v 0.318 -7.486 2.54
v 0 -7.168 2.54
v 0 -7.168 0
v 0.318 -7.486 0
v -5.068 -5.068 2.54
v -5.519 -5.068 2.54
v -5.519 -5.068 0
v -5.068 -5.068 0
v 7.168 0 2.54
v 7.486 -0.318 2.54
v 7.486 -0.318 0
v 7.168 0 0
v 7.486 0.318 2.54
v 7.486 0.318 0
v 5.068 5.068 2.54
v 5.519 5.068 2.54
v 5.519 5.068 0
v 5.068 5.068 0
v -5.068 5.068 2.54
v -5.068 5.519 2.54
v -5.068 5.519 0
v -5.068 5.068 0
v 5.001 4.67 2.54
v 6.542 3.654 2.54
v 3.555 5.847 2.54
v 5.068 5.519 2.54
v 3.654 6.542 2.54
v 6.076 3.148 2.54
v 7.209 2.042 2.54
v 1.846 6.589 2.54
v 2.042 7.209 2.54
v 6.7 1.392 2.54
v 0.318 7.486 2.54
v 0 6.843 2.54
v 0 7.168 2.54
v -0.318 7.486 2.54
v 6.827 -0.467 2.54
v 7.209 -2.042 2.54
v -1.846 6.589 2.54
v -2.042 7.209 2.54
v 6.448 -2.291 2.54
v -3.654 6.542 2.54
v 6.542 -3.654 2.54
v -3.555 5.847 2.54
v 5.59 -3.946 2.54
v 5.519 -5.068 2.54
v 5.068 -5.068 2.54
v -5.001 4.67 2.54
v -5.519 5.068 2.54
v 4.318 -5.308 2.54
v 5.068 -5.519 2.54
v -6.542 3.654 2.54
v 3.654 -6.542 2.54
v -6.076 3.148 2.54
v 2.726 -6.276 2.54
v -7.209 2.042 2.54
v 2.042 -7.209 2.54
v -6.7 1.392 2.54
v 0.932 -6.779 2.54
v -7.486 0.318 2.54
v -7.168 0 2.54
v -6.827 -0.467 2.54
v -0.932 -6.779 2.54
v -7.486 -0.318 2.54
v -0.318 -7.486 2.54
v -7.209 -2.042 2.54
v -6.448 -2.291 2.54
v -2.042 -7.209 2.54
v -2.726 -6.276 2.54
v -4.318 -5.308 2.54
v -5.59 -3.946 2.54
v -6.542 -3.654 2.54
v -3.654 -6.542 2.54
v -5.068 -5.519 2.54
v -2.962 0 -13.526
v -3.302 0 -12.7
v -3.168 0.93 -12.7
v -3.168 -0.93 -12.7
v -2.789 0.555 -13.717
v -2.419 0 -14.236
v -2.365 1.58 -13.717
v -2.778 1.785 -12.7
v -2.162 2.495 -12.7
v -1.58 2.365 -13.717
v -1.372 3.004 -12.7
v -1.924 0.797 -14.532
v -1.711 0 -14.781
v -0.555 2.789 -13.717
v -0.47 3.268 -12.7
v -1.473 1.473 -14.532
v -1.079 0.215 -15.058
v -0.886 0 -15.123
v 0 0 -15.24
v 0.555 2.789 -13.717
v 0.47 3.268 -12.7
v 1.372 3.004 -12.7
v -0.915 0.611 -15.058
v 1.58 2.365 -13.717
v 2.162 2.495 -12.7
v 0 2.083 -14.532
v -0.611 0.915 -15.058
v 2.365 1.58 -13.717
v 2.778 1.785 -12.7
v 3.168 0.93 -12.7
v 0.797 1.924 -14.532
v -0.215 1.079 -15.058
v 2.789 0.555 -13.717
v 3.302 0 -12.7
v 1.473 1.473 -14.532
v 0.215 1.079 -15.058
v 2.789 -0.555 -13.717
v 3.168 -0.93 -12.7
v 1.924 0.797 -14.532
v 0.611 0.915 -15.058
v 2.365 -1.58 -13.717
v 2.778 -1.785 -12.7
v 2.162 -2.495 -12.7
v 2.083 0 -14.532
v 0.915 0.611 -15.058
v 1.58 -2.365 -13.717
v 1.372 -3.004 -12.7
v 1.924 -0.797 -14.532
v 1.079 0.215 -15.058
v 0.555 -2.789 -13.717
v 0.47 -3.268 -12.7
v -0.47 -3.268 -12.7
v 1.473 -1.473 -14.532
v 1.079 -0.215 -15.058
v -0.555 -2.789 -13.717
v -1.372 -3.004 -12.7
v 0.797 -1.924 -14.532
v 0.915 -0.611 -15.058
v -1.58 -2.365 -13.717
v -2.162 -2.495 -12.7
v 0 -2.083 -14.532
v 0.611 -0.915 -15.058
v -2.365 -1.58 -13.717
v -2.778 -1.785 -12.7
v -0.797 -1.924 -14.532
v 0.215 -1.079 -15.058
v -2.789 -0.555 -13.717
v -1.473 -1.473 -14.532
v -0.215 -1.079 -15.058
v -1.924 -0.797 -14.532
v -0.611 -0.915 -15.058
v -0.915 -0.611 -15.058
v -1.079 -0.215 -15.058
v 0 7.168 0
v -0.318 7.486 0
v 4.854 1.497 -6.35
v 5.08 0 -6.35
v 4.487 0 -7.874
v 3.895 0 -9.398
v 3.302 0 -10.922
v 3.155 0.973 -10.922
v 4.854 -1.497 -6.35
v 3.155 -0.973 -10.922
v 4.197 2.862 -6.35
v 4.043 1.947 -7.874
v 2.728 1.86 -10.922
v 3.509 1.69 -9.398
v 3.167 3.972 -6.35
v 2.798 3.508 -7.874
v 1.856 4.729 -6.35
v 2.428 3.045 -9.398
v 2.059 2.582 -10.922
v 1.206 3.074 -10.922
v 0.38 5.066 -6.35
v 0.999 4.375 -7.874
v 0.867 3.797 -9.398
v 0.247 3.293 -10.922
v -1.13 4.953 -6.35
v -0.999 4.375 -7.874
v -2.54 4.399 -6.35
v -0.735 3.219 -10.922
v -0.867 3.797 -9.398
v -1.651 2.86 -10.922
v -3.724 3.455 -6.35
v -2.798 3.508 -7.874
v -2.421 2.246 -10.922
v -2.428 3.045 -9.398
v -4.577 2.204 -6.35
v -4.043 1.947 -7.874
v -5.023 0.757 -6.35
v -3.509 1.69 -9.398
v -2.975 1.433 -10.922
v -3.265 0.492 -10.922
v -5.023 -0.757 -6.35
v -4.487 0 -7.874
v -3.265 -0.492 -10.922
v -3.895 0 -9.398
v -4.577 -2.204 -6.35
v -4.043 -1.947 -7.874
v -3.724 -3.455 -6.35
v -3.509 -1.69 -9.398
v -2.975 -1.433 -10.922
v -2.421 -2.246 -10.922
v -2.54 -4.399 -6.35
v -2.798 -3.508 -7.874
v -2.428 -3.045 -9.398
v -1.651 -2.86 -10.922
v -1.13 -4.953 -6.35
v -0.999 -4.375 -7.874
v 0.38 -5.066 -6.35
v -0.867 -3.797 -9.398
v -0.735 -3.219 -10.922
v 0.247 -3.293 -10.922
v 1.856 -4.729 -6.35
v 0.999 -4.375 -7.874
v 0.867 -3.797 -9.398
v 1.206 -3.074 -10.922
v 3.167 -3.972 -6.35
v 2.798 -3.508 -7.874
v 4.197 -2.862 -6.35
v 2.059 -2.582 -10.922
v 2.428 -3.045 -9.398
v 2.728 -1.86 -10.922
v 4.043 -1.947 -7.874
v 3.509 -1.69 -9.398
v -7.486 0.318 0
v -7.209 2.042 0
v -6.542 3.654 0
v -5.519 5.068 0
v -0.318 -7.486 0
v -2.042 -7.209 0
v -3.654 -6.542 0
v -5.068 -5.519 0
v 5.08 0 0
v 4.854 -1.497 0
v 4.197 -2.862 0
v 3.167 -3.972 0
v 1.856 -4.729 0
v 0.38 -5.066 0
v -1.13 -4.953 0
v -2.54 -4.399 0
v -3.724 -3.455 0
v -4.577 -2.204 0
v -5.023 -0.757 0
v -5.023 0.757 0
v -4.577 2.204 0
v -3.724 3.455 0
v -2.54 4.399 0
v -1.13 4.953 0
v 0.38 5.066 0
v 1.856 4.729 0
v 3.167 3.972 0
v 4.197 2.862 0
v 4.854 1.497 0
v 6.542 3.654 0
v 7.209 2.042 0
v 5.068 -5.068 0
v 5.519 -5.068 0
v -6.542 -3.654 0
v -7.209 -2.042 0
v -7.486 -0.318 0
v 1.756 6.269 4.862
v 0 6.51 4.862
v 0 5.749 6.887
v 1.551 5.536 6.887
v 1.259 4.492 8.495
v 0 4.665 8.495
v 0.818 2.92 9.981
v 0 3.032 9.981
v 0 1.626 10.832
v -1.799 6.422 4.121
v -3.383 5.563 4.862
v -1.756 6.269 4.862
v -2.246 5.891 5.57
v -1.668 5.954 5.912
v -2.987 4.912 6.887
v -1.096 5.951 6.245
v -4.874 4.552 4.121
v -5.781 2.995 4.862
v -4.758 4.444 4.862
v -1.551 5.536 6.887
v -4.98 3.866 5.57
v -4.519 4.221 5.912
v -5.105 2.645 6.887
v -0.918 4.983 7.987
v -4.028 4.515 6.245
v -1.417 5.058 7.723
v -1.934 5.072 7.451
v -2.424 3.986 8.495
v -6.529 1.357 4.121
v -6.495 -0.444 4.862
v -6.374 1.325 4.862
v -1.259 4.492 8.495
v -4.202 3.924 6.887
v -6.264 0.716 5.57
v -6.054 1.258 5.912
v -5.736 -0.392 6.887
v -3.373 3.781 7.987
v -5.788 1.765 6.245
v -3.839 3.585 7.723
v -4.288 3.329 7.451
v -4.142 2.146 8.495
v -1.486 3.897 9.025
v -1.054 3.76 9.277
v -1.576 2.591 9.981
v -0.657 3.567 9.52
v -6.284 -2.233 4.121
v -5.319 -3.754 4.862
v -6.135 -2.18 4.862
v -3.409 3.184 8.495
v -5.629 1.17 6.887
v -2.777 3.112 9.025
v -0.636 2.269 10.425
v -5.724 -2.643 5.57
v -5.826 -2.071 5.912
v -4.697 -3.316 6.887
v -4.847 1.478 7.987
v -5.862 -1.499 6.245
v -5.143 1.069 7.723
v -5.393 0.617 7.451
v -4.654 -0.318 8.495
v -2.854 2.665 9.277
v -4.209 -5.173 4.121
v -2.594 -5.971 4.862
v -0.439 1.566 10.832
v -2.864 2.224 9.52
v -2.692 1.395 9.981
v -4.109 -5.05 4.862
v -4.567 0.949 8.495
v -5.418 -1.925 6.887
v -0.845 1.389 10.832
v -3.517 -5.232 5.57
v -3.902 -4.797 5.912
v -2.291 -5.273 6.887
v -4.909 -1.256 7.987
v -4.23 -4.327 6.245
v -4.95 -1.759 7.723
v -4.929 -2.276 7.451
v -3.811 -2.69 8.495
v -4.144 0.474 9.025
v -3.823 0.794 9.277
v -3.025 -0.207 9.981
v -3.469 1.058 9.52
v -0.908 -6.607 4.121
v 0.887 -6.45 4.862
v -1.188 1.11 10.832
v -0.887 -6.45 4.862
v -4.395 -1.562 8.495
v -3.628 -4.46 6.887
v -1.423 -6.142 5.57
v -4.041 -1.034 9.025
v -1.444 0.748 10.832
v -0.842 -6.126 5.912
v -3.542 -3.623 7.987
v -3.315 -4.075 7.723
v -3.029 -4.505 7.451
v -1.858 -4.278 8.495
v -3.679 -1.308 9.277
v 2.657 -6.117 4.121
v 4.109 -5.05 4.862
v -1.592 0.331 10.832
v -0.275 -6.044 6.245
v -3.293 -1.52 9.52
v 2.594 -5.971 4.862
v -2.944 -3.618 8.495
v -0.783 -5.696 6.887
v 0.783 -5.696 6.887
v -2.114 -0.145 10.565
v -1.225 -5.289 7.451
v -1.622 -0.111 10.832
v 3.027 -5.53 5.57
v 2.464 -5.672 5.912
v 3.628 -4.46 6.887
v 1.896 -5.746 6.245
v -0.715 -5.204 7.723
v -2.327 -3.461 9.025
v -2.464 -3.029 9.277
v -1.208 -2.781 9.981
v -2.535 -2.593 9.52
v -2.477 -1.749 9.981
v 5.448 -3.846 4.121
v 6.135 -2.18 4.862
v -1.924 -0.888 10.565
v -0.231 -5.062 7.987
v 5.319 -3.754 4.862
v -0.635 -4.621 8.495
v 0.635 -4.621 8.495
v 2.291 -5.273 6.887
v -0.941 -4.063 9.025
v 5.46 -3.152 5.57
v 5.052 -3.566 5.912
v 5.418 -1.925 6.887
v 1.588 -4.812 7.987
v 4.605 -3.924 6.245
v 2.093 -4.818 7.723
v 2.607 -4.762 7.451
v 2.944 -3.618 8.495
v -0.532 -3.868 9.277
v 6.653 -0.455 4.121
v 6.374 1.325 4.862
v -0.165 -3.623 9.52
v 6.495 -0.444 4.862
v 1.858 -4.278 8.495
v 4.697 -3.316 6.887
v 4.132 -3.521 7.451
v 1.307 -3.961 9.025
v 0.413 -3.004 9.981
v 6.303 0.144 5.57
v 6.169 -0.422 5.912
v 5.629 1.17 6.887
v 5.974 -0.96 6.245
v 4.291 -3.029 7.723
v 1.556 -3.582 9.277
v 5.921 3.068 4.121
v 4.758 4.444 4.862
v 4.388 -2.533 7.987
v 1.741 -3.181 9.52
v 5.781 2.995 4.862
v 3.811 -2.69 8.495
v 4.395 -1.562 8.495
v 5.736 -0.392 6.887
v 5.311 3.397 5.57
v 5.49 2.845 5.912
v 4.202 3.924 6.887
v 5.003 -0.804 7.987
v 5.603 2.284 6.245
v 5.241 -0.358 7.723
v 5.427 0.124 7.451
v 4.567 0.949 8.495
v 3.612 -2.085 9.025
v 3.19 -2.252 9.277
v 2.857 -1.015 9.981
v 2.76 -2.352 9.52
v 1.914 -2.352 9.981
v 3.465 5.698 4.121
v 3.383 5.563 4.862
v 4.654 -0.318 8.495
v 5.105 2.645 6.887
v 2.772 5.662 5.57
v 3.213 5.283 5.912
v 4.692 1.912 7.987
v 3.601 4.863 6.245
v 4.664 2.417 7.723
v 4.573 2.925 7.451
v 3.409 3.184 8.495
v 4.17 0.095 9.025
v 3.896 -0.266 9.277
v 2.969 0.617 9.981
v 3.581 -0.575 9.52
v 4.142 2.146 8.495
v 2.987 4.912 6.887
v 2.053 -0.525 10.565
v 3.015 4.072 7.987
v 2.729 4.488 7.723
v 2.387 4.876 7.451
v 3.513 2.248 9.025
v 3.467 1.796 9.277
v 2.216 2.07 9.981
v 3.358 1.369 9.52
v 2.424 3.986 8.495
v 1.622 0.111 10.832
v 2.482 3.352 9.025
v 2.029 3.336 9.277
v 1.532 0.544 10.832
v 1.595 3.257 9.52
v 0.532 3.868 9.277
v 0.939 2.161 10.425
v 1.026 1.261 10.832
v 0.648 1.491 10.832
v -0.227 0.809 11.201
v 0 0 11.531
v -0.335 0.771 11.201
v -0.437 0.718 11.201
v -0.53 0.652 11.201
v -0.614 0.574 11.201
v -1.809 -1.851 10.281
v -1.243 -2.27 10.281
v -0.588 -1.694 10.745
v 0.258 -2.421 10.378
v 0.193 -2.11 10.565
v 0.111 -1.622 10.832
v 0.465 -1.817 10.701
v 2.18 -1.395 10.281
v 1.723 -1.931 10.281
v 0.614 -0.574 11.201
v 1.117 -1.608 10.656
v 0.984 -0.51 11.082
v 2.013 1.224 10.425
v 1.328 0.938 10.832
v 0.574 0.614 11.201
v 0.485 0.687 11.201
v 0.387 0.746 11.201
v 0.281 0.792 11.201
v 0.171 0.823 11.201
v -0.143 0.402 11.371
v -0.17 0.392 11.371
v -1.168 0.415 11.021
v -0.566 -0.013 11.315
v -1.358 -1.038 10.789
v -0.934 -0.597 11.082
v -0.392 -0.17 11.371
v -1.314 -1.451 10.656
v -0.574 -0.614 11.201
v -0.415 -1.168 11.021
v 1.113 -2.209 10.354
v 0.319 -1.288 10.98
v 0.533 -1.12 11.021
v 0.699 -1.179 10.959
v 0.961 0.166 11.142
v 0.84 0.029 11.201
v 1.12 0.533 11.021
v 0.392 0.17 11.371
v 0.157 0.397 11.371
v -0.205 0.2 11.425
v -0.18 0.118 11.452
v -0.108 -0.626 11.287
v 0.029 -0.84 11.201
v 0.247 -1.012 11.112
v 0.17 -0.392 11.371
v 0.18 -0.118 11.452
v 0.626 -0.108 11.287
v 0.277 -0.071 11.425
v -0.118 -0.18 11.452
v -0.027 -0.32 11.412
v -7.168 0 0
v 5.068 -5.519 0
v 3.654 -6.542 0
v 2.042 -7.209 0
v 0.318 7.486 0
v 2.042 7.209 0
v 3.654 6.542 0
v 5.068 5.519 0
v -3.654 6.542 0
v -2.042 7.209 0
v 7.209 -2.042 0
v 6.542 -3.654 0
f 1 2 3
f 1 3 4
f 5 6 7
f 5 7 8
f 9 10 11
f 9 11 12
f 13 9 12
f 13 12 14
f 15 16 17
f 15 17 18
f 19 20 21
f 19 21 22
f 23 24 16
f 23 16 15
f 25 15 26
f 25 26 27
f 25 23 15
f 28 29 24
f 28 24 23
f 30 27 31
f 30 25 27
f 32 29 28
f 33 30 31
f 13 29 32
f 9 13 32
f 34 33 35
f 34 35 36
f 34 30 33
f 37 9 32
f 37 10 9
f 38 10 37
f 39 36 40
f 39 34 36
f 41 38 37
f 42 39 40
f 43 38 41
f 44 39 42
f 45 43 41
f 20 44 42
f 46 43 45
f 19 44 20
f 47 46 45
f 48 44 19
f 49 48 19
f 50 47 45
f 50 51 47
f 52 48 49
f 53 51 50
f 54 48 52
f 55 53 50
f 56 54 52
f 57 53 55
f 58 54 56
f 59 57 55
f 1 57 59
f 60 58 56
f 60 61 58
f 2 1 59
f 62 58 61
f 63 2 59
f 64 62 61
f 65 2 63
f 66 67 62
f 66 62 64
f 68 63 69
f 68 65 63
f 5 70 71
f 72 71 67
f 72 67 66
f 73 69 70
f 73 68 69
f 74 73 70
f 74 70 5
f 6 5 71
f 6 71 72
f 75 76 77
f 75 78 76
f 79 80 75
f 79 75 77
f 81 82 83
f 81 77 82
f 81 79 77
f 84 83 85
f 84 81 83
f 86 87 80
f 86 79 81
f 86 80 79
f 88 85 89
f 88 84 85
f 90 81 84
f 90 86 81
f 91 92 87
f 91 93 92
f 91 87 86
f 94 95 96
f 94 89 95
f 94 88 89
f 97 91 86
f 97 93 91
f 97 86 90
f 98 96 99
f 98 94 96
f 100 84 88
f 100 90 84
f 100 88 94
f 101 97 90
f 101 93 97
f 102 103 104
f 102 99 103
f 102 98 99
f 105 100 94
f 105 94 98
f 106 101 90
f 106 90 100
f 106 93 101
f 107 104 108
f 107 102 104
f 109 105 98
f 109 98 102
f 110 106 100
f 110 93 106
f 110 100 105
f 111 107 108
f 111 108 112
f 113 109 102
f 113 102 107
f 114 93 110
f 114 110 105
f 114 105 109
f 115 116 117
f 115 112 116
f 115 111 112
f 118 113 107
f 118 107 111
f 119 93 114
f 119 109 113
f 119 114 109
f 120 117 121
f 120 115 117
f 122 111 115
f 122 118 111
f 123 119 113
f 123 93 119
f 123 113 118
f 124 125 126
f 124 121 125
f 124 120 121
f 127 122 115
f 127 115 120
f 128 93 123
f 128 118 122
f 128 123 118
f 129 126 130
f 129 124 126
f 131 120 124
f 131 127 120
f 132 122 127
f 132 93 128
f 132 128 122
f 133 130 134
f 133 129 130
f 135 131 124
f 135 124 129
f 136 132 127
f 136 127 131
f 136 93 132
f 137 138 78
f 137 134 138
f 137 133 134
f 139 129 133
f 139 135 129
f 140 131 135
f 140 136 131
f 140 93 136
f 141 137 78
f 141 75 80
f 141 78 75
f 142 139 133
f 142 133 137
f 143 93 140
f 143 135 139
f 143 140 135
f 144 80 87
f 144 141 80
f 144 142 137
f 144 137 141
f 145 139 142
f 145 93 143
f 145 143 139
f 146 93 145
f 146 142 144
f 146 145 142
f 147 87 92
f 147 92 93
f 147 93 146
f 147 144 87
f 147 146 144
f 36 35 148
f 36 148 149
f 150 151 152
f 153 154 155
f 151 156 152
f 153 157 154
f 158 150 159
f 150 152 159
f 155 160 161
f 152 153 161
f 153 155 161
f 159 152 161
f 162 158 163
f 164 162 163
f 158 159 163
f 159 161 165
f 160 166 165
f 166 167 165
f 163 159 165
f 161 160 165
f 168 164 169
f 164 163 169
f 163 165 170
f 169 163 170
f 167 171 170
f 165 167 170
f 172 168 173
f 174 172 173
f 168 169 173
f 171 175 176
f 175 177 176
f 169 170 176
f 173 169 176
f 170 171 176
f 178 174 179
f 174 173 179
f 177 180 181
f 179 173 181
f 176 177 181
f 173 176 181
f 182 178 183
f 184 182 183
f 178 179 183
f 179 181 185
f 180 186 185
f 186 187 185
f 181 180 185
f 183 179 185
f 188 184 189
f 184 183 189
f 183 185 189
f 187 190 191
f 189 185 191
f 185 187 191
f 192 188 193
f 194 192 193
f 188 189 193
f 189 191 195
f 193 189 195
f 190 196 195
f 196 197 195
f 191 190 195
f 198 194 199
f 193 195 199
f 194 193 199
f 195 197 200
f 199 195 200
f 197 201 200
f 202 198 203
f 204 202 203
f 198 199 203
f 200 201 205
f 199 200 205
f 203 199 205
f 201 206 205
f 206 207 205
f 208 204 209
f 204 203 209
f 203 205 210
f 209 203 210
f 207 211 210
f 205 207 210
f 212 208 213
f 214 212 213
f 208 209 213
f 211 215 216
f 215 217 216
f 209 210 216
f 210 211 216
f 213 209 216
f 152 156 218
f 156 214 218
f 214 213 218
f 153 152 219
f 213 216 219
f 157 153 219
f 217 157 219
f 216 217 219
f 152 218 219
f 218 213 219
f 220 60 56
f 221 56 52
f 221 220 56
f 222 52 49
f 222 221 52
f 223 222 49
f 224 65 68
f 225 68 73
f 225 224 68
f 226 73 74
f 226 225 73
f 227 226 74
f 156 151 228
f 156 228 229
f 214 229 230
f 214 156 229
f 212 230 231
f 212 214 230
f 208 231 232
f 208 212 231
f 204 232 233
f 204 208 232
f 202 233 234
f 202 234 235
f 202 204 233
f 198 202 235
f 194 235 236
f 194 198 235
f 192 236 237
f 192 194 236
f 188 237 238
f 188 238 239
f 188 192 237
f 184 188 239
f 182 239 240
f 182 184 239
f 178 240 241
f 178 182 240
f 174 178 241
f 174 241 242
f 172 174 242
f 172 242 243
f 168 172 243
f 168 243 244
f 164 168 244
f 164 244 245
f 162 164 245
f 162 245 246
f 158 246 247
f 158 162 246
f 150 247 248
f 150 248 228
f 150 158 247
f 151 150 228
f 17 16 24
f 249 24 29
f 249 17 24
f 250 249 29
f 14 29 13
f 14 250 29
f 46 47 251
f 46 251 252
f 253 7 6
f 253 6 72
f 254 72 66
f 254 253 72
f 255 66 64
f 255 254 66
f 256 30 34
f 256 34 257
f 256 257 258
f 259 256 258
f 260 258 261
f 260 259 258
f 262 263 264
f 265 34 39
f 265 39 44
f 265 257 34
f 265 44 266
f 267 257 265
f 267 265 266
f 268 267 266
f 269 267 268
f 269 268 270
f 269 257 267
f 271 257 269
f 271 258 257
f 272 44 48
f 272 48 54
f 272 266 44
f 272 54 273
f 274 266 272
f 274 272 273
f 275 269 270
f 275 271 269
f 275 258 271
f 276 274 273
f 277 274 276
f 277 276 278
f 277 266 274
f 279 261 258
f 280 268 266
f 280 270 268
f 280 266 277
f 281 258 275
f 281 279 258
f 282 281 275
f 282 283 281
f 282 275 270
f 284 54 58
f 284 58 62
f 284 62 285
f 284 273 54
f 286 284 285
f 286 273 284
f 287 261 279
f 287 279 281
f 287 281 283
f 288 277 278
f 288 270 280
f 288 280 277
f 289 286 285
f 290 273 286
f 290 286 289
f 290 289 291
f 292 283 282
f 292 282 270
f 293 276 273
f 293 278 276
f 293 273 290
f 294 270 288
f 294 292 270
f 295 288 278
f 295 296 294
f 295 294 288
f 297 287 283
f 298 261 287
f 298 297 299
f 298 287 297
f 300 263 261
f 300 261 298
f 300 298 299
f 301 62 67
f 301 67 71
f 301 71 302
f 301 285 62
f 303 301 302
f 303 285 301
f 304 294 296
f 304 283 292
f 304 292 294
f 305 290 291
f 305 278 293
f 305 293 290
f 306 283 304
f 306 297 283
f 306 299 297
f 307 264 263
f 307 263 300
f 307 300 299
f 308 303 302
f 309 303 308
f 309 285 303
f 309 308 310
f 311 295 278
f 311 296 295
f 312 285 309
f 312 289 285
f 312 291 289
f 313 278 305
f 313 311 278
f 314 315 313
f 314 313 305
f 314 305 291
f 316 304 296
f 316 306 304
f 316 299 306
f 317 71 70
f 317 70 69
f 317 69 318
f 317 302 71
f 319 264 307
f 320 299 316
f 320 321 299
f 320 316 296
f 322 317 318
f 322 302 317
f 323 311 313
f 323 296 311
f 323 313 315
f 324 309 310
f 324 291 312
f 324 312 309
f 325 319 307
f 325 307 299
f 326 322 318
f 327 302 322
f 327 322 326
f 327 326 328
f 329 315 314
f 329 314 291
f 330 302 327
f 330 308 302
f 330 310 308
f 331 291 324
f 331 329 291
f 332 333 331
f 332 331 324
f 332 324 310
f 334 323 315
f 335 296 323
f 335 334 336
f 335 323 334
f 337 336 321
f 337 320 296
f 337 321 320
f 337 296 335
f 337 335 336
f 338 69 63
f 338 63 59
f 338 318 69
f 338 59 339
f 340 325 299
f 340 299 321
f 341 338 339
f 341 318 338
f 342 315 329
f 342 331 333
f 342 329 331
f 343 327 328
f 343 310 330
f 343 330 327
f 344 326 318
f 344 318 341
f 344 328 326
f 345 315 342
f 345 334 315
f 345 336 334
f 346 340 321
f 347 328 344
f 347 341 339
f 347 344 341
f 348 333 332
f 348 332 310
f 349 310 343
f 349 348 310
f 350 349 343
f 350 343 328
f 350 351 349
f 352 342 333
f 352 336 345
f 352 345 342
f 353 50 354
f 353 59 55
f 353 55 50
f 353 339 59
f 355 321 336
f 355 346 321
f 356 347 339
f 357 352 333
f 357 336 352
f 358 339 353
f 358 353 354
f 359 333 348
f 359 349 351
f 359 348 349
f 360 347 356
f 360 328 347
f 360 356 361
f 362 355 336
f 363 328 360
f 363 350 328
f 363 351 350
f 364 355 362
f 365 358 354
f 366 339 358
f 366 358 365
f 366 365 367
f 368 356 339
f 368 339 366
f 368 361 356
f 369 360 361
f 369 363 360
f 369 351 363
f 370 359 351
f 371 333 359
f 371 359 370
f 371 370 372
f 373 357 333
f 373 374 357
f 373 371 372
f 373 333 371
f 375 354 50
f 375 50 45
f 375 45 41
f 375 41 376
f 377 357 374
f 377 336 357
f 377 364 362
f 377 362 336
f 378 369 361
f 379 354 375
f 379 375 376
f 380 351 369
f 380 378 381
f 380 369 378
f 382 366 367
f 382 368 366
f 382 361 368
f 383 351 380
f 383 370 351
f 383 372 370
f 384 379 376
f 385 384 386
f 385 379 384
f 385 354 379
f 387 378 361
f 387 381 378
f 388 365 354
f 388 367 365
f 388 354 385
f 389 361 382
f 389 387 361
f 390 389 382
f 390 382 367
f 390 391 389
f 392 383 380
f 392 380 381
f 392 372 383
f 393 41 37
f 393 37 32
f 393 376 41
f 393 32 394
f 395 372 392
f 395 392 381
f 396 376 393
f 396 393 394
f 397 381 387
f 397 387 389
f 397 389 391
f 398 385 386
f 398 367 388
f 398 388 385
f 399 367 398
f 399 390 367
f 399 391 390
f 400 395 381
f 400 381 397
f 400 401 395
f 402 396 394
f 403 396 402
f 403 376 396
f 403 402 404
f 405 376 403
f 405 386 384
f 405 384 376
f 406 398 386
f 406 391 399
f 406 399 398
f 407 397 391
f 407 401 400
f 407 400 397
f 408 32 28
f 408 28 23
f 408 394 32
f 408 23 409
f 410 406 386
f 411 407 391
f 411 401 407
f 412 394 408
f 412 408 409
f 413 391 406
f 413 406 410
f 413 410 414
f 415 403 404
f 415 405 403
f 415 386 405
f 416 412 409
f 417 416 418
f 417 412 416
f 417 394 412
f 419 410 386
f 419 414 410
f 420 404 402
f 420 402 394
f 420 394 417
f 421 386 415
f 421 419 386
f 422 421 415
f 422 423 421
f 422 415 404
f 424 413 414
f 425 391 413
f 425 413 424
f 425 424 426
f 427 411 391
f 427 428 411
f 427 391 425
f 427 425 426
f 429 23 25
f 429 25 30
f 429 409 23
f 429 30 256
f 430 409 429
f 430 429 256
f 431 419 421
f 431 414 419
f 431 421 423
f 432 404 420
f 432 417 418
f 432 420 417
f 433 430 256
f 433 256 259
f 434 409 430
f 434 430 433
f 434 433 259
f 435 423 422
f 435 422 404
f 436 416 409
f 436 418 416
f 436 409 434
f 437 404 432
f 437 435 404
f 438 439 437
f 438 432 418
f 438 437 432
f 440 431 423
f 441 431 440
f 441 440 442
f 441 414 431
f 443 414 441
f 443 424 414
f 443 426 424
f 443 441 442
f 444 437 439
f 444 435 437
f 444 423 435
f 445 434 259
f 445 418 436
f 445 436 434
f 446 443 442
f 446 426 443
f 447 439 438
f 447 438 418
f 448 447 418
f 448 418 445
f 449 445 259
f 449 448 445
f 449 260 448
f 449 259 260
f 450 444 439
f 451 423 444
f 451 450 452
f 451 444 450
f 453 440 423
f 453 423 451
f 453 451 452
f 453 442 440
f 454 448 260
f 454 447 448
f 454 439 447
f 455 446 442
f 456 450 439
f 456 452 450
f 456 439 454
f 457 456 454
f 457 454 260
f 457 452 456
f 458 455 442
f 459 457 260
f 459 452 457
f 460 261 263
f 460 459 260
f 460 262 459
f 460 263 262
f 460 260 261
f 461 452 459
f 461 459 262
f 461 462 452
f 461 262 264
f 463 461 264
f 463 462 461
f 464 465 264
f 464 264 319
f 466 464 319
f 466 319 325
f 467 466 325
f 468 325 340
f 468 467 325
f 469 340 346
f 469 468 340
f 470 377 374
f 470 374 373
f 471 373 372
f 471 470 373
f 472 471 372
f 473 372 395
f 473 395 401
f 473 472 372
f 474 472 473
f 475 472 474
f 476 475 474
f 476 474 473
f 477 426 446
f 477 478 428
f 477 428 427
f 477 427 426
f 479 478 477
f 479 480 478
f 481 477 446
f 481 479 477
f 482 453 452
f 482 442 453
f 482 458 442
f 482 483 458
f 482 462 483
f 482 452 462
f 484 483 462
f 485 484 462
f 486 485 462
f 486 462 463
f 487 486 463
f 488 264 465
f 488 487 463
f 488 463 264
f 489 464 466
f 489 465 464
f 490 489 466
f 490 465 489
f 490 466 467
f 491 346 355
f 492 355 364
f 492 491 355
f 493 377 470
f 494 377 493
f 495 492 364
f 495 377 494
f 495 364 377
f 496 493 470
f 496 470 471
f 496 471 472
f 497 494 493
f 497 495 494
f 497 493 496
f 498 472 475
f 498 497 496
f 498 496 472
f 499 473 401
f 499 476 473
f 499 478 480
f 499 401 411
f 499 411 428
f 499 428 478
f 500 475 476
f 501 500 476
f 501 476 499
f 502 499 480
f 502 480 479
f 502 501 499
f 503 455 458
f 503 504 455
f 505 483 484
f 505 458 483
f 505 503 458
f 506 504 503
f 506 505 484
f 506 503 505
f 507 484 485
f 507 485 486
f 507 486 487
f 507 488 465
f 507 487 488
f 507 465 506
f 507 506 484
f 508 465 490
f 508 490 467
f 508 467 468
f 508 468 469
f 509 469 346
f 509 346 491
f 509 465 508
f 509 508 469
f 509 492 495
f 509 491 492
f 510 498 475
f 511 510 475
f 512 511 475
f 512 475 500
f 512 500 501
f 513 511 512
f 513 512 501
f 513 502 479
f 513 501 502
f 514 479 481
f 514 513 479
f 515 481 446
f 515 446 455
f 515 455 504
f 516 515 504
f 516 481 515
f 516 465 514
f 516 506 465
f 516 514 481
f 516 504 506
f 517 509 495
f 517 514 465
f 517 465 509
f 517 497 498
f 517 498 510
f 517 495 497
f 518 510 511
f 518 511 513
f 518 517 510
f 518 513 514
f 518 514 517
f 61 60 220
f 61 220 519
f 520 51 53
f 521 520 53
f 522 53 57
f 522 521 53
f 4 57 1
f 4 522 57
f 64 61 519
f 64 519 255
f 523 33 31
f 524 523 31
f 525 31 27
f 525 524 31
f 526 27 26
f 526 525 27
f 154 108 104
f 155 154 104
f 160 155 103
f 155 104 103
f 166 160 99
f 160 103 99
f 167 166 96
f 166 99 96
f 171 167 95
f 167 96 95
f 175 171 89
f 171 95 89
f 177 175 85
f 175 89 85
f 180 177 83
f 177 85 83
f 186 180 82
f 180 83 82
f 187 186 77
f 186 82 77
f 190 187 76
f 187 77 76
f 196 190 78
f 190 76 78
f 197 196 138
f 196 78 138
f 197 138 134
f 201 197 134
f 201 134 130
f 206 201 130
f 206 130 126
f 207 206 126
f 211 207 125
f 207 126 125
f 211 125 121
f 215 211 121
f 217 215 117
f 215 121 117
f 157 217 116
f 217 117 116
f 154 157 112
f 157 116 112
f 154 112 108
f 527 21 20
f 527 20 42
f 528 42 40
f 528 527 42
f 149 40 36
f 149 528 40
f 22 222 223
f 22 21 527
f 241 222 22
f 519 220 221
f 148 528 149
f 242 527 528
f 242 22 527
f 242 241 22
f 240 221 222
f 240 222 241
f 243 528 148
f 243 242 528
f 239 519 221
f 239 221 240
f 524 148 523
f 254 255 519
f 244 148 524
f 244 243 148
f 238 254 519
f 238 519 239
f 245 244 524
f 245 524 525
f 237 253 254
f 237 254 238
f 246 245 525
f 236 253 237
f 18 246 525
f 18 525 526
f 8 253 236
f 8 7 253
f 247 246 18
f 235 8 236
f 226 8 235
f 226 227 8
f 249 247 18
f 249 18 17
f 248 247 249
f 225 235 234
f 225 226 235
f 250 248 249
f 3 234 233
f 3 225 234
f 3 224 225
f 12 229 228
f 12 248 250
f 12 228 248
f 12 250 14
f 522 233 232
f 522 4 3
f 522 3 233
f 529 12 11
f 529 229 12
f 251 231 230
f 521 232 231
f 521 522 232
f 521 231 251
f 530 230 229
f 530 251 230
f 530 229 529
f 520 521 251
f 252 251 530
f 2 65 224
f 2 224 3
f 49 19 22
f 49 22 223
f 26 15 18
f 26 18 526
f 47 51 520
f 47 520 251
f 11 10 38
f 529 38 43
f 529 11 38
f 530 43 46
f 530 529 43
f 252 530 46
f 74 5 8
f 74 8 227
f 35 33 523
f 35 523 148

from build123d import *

# Parameters (mm, degrees)
DOME1_FACE_RADIUS = 3.302
DOME1_HEIGHT      = 2.54
SEEDCUT_DEPTH     = 21.698272826
CIRPATTERN1_COUNT = 8


# Read off the part's stored shape, not the designer's step: Cut-Revolve-Thin3
with BuildPart() as part:
    # Sketch1 → Revolve1 (revolve)
    with BuildSketch(Plane(origin=(0, 0, 0), x_dir=(0, 0, -1), z_dir=(1, 0, 0)), mode=Mode.PRIVATE) as revolve1_sk:
        Polygon((-2.54, 0), (-2.54, 7.493), (0, 7.493), (0, 5.08), (12.7, 5.08), (12.7, 0), align=None)
    revolve(revolve1_sk.sketch.rotate(Axis((0, 0, 9.999244512), (0, 0, -1)), 90), axis=Axis((0, 0, 9.999244512), (0, 0, -1)))

    # Sketch2 → Revolve2 (revolve)
    with BuildSketch(Plane(origin=(0, 0, 0), x_dir=(0, 0, -1), z_dir=(1, 0, 0))):
        with BuildLine():
            Line((-11.531198063, 0), (-2.54, 0))
            Line((-2.54, 0), (-2.54, 6.84268102))
            add(Edge.make_bspline(
                [(-2.54, 6.84268102), (-9.189579749, 6.525332983), (-11.531198063, 0)],
                knots=[0, 0, 0, 1, 1, 1], degree=2))
        make_face()
    revolve(axis=Axis((0, 0, 9.999244512), (0, 0, 1)))

    # Cut-Revolve-Thin3 outline → Cut-Revolve-Thin3 (revolve, cut)
    with BuildSketch(Plane.XZ):
        Polygon((3.302, -10.922), (3.302, -12.7), (5.08, -12.7), (5.08, -6.35), align=None)
    revolve(axis=Axis((0, 0, 0), (0, 0, 1)), mode=Mode.SUBTRACT)

    # Dome1: a dome of height H over a round flat face of radius A is a cap of a sphere of radius (A * A + H * H) / (2 * H)
    dome1_r = (DOME1_FACE_RADIUS * DOME1_FACE_RADIUS + DOME1_HEIGHT * DOME1_HEIGHT) / (2 * DOME1_HEIGHT)
    dome1_base = Plane((0, 0, -12.7), z_dir=(0, 0, -1))
    with Locations(dome1_base.offset(DOME1_HEIGHT - dome1_r)):
        dome1_ball = Sphere(dome1_r, mode=Mode.PRIVATE)
    add(split(dome1_ball, bisect_by=dome1_base, keep=Keep.TOP, mode=Mode.PRIVATE))

    # Sketch4 → SeedCut (cut, through all)
    with BuildSketch(Plane.XY.offset(2.54)):
        with BuildLine():
            Line((0, 7.16784051), (-0.318391894, 7.486232404))
            ThreePointArc((-0.318391894, 7.486232404), (0, 7.493), (0.318391894, 7.486232404))
            Line((0.318391894, 7.486232404), (0, 7.16784051))
        make_face()
    seedcut = extrude(amount=-SEEDCUT_DEPTH, mode=Mode.SUBTRACT)

    # CirPattern1: SeedCut ×8 about axis
    cirpattern1_axis = Axis((0, 0, 0), (0, 0, 1))
    for i in range(1, CIRPATTERN1_COUNT):
        add(seedcut.rotate(cirpattern1_axis, i * 360 / CIRPATTERN1_COUNT), mode=Mode.SUBTRACT)


solid = part.part
